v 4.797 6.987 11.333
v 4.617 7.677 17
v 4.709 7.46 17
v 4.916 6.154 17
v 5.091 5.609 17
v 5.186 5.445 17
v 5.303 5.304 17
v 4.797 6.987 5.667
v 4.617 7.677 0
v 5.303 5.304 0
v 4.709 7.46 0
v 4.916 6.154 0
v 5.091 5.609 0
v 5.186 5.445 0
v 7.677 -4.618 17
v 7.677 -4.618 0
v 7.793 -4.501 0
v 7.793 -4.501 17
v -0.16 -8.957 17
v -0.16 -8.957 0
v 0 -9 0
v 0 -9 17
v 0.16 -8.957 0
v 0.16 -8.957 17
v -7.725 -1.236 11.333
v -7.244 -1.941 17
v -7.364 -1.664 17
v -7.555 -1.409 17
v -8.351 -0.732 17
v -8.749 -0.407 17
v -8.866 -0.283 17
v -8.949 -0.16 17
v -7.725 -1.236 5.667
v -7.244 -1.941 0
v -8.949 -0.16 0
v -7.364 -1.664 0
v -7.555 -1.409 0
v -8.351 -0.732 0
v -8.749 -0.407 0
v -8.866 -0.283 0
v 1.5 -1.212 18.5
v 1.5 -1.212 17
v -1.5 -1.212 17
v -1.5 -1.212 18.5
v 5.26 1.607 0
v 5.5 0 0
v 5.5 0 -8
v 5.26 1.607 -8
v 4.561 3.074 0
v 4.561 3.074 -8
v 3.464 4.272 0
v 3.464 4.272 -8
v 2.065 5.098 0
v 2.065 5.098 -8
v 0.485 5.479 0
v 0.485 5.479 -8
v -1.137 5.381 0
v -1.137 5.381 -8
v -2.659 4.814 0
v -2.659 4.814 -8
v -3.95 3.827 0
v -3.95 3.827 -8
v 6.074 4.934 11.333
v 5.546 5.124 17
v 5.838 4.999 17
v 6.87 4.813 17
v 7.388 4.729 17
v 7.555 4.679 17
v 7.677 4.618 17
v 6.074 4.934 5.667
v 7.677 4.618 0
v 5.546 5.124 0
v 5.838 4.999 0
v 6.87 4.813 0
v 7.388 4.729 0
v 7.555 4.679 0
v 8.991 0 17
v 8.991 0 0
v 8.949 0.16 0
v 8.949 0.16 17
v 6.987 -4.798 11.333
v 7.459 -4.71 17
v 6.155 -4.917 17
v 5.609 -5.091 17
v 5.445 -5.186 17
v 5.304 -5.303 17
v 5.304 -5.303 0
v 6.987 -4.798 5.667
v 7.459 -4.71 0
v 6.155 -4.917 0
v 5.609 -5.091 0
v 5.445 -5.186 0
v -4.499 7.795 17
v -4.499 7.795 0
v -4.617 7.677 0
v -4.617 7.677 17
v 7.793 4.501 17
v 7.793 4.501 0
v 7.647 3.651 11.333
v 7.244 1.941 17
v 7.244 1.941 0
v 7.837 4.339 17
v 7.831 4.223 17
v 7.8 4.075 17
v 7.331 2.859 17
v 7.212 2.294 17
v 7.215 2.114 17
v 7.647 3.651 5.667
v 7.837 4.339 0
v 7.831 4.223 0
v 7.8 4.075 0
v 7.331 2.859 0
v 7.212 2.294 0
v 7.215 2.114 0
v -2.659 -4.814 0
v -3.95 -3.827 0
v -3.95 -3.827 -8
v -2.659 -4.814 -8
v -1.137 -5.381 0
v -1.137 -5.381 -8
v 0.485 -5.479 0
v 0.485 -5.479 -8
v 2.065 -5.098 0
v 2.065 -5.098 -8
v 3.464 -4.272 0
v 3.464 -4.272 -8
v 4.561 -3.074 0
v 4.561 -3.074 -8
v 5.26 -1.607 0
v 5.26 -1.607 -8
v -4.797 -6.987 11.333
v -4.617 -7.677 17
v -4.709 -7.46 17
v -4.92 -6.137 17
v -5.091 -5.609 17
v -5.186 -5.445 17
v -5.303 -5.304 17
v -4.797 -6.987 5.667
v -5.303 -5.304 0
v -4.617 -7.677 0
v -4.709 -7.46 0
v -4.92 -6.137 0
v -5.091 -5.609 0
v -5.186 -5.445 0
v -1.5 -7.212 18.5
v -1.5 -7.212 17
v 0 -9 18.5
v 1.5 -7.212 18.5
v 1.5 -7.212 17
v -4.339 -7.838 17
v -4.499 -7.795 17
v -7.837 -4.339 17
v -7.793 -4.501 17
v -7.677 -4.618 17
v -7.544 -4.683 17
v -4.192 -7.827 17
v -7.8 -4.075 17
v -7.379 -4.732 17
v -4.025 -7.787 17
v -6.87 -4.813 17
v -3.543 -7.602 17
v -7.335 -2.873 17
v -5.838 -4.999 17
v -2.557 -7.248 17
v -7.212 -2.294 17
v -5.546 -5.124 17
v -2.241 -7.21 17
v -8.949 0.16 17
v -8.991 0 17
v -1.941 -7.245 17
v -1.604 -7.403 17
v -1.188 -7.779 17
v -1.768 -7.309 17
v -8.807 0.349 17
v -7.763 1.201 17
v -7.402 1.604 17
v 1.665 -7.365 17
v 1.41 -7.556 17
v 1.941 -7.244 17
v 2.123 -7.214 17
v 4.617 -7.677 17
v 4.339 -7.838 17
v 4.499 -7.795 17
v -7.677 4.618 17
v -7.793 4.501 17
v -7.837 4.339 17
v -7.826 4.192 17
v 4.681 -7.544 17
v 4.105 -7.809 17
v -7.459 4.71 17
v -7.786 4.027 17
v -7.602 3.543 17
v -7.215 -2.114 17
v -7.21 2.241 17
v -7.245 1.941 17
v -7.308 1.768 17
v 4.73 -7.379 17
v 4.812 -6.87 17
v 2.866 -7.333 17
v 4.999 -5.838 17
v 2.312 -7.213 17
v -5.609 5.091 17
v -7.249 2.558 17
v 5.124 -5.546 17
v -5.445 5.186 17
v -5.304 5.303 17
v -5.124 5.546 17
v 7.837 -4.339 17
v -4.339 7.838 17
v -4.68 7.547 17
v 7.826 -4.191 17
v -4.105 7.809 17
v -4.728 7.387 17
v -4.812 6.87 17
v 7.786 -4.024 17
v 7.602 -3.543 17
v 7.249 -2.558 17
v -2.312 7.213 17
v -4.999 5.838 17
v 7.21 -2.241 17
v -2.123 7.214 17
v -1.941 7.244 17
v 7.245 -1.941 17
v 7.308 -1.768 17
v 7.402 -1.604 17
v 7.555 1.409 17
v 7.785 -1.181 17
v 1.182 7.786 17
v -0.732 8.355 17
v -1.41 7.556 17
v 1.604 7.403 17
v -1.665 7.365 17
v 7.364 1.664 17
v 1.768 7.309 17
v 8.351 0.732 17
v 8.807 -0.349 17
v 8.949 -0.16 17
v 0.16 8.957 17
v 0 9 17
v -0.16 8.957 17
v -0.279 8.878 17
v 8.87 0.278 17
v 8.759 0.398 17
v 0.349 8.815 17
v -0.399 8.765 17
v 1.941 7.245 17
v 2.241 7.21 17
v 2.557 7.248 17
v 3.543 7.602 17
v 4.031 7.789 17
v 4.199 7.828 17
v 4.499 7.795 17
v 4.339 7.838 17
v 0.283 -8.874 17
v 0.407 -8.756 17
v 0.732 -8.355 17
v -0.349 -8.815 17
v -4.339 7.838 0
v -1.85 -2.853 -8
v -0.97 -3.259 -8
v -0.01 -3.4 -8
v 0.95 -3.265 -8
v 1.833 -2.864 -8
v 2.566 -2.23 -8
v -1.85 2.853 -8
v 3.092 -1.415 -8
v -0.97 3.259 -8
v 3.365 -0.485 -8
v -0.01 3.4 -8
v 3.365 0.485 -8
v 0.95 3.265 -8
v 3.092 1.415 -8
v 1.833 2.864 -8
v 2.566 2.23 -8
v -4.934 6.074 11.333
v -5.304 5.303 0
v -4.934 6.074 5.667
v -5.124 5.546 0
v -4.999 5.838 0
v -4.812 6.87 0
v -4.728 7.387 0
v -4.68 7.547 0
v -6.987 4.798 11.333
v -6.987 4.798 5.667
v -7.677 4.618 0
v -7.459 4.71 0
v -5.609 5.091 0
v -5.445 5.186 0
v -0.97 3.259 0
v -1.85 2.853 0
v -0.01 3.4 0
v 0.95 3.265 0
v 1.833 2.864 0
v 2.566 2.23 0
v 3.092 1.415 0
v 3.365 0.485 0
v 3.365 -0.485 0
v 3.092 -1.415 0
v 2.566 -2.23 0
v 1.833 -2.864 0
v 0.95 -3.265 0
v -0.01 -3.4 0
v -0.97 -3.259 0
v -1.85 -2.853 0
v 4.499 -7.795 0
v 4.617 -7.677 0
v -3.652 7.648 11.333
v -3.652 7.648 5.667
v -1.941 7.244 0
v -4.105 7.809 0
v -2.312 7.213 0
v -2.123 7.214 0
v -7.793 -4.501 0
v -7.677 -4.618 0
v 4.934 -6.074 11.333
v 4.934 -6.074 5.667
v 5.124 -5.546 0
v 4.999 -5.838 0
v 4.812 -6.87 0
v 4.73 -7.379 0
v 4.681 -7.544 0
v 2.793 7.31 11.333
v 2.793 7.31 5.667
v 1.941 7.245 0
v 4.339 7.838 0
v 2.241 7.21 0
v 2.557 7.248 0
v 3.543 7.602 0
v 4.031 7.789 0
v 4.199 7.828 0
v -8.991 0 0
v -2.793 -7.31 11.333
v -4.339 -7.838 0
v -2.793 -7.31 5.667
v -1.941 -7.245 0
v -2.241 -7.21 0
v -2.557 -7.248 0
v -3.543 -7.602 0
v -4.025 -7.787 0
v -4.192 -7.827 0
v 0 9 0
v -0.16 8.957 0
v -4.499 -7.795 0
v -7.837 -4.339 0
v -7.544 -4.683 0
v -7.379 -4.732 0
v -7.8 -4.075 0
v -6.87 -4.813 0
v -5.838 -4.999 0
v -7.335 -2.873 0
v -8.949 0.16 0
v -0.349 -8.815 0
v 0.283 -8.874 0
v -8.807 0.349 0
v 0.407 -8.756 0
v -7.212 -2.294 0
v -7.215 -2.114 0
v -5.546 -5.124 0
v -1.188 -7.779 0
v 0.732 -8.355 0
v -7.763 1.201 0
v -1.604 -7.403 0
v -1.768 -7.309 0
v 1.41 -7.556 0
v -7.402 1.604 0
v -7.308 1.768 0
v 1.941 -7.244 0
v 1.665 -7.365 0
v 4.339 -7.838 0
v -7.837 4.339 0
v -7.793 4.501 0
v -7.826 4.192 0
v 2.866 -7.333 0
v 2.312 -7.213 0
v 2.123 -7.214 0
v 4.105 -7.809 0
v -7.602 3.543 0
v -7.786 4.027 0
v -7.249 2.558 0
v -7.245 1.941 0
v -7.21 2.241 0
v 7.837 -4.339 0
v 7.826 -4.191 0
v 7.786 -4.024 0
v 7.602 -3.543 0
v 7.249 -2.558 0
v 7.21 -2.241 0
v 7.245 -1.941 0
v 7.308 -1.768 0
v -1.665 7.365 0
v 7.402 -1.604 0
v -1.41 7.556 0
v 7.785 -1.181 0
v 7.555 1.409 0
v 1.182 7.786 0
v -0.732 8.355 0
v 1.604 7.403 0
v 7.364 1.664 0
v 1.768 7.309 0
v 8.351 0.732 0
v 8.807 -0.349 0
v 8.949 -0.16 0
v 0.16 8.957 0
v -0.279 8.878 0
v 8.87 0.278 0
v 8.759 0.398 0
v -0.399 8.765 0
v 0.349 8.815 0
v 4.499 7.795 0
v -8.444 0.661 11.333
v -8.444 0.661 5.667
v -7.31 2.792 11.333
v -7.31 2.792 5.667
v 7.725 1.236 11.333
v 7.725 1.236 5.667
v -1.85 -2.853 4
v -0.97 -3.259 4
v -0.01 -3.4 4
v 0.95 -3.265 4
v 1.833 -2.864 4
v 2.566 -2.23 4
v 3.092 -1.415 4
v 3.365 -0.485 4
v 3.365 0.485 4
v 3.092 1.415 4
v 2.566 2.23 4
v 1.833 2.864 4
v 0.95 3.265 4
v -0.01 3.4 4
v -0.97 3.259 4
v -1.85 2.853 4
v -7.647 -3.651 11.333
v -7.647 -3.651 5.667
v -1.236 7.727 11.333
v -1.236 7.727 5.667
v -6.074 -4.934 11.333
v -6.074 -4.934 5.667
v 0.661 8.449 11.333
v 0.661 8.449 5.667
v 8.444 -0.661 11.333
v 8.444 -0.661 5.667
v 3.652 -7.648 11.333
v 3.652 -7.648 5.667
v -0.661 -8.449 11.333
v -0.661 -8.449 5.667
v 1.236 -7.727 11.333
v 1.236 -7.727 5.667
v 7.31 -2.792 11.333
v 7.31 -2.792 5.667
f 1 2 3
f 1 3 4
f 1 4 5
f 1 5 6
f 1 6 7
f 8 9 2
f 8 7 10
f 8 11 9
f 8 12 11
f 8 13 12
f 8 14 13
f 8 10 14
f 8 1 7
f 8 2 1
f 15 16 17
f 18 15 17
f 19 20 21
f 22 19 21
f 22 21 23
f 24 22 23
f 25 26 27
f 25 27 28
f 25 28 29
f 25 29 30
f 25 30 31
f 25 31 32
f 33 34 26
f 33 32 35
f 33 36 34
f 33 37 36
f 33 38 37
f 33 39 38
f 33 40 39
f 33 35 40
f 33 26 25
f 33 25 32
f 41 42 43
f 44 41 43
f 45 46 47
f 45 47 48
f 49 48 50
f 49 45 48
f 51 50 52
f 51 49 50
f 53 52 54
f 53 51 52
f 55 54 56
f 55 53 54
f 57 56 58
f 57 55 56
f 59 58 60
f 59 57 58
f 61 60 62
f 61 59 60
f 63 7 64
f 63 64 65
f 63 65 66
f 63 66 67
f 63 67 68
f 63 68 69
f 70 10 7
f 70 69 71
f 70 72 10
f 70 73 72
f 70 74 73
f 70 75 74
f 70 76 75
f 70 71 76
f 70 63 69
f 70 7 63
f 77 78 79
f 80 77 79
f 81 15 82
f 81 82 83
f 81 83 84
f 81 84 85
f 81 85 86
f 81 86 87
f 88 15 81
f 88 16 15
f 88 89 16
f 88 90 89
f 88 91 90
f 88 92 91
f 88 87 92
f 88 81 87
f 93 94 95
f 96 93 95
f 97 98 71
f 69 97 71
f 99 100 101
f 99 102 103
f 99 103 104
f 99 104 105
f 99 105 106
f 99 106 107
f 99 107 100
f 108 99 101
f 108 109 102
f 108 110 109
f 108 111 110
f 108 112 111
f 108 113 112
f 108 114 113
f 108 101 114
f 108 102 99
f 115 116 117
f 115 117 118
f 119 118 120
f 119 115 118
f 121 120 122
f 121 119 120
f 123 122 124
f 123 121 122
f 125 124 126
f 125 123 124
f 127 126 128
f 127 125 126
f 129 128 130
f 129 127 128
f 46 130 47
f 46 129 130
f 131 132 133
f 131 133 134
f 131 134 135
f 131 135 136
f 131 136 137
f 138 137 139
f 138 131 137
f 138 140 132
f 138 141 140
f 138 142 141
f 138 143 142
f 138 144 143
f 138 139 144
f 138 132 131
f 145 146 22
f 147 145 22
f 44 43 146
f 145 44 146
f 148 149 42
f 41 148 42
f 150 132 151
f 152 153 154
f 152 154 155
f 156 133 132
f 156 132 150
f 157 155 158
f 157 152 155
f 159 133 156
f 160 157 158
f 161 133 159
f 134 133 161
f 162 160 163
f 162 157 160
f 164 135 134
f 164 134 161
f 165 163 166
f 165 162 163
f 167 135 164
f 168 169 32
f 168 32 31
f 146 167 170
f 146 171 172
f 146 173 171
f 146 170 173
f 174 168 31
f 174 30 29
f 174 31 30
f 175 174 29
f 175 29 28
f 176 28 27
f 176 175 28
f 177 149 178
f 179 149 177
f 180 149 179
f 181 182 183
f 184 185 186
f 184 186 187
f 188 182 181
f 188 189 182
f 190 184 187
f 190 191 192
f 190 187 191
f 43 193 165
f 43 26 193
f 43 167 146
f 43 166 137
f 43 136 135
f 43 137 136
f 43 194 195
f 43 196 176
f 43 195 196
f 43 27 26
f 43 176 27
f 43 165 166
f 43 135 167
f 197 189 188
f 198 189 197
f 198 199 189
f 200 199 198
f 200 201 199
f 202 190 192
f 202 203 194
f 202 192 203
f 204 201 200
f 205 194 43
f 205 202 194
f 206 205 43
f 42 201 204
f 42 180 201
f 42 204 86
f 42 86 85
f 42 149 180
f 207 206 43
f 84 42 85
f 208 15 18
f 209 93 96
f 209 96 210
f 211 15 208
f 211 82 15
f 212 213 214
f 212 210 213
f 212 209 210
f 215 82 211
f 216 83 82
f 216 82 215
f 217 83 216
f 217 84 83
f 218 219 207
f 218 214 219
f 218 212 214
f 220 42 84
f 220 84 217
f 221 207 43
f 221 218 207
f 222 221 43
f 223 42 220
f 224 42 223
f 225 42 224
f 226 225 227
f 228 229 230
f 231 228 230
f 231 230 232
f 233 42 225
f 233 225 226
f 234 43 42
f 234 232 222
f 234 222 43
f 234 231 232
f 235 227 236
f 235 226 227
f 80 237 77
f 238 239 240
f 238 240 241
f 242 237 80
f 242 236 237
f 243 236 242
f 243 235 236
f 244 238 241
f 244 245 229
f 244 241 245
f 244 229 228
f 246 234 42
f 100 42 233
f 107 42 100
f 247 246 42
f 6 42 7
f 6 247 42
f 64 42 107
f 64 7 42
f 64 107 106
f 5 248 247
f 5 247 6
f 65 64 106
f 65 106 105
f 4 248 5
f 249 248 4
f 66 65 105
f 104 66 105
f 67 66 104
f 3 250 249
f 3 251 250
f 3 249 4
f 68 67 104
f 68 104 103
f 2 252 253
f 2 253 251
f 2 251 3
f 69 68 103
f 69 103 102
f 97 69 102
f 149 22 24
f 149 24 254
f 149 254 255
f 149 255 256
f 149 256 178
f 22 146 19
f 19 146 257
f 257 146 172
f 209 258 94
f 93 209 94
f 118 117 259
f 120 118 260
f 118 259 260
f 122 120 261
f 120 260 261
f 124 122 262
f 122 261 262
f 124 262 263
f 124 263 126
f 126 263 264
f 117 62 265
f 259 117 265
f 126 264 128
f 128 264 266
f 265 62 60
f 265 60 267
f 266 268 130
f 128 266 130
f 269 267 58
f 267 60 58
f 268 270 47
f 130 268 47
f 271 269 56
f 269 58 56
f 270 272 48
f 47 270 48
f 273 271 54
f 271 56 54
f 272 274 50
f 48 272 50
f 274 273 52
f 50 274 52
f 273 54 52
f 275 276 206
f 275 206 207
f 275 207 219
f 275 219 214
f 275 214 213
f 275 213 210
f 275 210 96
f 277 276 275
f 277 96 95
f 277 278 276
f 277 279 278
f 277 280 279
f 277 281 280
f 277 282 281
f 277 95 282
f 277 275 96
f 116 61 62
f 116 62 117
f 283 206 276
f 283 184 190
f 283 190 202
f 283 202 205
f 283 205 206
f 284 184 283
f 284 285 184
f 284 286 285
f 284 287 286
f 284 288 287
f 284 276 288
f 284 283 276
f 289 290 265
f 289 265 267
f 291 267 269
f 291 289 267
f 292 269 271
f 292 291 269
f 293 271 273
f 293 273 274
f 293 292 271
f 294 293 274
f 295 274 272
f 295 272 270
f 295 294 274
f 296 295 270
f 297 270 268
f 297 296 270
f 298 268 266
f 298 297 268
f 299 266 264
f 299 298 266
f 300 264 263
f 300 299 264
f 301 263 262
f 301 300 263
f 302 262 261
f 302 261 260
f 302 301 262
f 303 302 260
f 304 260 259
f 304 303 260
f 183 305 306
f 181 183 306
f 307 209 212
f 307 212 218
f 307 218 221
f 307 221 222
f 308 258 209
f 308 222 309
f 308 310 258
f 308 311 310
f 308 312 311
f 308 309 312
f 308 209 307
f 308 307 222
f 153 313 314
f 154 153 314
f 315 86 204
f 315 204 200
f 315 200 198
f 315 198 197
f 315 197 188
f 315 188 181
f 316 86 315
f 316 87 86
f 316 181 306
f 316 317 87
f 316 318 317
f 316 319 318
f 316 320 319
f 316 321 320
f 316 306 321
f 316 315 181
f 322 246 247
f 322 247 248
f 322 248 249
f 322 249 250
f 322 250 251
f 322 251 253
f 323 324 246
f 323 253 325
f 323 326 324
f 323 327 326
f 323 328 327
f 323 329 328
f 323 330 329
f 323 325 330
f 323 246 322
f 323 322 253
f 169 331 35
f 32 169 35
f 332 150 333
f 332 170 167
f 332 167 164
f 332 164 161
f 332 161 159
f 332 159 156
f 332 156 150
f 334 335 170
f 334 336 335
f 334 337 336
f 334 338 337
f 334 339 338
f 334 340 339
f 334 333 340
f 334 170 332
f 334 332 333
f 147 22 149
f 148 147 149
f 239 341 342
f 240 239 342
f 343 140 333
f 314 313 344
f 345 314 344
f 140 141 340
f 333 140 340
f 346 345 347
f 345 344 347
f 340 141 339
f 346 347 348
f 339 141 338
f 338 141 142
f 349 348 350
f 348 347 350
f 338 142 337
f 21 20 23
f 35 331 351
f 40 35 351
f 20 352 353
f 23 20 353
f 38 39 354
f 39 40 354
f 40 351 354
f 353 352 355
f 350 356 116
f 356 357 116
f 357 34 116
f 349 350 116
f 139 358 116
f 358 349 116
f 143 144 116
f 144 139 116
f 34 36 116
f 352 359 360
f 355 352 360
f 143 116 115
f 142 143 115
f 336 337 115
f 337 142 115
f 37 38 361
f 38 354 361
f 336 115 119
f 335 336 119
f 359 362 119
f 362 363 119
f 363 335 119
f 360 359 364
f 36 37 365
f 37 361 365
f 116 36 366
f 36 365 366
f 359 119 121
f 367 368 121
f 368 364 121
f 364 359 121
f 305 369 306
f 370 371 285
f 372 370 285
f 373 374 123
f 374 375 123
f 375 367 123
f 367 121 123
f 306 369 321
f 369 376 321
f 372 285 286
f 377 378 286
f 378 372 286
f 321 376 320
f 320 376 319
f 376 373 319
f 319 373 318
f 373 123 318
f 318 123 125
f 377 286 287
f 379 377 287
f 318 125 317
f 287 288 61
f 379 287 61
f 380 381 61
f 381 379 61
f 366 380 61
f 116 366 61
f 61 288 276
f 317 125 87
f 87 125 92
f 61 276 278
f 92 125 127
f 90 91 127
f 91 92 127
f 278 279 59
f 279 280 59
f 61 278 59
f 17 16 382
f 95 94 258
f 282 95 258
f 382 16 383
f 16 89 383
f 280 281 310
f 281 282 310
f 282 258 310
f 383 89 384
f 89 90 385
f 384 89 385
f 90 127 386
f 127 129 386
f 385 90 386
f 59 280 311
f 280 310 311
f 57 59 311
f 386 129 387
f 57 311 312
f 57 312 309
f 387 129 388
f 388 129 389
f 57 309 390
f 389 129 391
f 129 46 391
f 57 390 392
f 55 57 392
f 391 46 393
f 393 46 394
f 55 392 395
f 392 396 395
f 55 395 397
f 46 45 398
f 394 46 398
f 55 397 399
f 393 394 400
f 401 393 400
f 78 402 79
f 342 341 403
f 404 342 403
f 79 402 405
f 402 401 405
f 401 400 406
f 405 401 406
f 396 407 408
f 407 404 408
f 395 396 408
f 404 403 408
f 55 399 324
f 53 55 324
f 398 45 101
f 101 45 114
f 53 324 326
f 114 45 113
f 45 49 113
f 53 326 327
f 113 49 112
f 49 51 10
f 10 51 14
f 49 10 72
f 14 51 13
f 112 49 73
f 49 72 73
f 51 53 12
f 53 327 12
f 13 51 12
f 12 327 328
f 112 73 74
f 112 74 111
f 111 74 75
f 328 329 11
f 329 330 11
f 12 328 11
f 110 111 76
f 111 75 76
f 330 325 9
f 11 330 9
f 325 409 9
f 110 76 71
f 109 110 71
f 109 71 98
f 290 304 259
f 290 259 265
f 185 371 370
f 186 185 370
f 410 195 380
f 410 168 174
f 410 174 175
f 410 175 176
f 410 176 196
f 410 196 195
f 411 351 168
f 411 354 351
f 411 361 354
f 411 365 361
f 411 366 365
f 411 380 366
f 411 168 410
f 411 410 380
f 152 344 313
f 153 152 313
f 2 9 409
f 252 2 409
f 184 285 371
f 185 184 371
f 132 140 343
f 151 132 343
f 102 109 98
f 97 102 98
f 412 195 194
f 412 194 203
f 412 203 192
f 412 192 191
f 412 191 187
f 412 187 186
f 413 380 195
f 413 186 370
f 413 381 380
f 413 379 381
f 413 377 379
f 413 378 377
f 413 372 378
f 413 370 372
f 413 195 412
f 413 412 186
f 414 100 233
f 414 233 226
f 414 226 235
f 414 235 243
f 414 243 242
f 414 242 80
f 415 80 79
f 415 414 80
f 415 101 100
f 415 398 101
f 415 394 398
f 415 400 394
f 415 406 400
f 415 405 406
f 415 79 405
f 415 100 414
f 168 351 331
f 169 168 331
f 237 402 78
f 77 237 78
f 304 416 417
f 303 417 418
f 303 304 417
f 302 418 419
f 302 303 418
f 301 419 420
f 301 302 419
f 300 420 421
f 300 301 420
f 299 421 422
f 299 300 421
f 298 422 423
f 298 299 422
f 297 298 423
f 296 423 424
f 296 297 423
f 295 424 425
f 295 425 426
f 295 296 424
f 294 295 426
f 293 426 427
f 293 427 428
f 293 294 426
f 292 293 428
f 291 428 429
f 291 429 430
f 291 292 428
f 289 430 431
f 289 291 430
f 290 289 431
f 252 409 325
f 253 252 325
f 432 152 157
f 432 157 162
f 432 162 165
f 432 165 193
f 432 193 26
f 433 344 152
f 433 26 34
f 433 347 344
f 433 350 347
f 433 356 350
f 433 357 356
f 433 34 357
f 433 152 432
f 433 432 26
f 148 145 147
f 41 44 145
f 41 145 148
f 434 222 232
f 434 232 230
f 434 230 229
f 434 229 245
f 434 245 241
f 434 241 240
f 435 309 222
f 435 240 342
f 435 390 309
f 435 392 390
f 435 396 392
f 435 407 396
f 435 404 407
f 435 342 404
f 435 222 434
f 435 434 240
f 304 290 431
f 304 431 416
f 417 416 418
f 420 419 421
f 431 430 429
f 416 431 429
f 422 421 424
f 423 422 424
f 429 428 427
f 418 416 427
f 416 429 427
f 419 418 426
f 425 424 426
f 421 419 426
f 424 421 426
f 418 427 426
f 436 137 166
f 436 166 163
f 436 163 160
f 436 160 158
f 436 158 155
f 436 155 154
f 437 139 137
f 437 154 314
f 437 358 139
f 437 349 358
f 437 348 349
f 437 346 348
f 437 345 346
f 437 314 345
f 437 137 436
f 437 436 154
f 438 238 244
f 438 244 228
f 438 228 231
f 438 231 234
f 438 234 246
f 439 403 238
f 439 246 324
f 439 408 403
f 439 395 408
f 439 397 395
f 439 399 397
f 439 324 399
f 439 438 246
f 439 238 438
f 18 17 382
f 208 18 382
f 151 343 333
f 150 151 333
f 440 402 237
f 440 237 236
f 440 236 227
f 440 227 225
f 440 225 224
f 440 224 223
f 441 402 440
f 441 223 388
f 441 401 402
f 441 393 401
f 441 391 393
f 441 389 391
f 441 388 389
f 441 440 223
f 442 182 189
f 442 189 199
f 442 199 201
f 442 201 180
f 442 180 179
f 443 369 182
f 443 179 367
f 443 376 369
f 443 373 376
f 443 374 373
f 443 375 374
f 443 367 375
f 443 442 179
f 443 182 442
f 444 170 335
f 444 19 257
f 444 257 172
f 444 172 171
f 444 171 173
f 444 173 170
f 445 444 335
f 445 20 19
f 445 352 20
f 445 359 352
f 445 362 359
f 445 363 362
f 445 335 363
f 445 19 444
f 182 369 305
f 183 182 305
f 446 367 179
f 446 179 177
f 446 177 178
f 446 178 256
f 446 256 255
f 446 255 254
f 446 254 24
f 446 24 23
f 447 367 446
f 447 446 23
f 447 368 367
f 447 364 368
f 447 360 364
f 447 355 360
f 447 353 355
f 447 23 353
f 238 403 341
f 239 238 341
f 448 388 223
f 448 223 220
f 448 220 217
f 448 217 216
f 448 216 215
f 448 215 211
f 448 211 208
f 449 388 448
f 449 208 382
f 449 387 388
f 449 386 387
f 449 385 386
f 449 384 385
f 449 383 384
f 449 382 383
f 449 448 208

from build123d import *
from build123d import SkipClean  # not in build123d's __all__

# Parameters (mm, degrees)
F1_DEPTH = 17
F2_DEPTH = 8
F3_DEPTH = 4
F5_DEPTH = 1.5


# Not quite as in the source:
# - after a boolean that leaves OpenCascade's solid faulty, fix() repairs it
# - a feature names something its author has since deleted; it is built from what else it names


with BuildPart() as f1:
    # F0 (on Top) → F1 (new body)
    with BuildSketch(Plane.XY):
        Polygon((-7.2445266217, 1.9408333333), (-7.2443607594, -1.9414523397), (-5.303074282, -5.3035274261), (-1.9408333333, -7.2445266217), (1.9414523397, -7.2443607594), (5.3035274261, -5.303074282), (7.2445266217, -1.9408333333), (7.2443607594, 1.9414523397), (5.303074282, 5.3035274261), (1.9408333333, 7.2445266217), (-1.9414523397, 7.2443607594), (-5.3035274261, 5.303074282), align=None)
        with BuildLine():
            ThreePointArc((-3.95, 3.8272052467), (2.0645822822, 5.0977936404), (5.5, 0))
            ThreePointArc((5.5, 0), (2.0645822822, -5.0977936404), (-3.95, -3.8272052467))
            ThreePointArc((-3.95, -3.8272052467), (-5.5, 0), (-3.95, 3.8272052467))
        make_face(mode=Mode.SUBTRACT)
        with BuildLine():
            ThreePointArc((-3.95, -3.8272052467), (2.0645822822, -5.0977936404), (5.5, 0))
            ThreePointArc((5.5, 0), (2.0645822822, 5.0977936404), (-3.95, 3.8272052467))
            Line((-3.95, 3.8272052467), (-3.95, -3.8272052467))
        make_face()
        with BuildLine():
            Line((-1.85, -2.8526303651), (-1.85, 2.8526303651))
            ThreePointArc((-1.85, 2.8526303651), (3.4, 0), (-1.85, -2.8526303651))
        make_face(mode=Mode.SUBTRACT)
        with BuildLine():
            ThreePointArc((-1.85, -2.8526303651), (3.4, 0), (-1.85, 2.8526303651))
            Line((-1.85, 2.8526303651), (-1.85, -2.8526303651))
        make_face()
        with BuildLine():
            Line((-3.95, -3.8272052467), (-3.95, 3.8272052467))
            ThreePointArc((-3.95, 3.8272052467), (-5.5, 0), (-3.95, -3.8272052467))
        make_face()
        with BuildLine():
            add(Edge.make_bspline(
                [(5.303074282, 5.3035274261), (5.8806686185, 4.7260804431), (7.2203514603, 4.9114598493), (7.6765424159, 4.6182190274)],
                knots=[0.1250207704, 0.1250207704, 0.1250207704, 0.1250207704, 0.1625294045, 0.1625294045, 0.1625294045, 0.1625294045], degree=3))
            Line((5.303074282, 5.3035274261), (7.2443607594, 1.9414523397))
            add(Edge.make_bspline(
                [(7.836712211, 4.338802441), (7.8605022236, 3.7962755696), (7.0343491304, 2.7298107055), (7.2443607594, 1.9414523397)],
                knots=[0.1709157668, 0.1709157668, 0.1709157668, 0.1709157668, 0.2083694642, 0.2083694642, 0.2083694642, 0.2083694642], degree=3))
            Line((7.836712211, 4.338802441), (7.7934595092, 4.5013319004))
            Line((7.7934595092, 4.5013319004), (7.6765424159, 4.6182190274))
        make_face()
        with BuildLine():
            Line((7.2445266217, -1.9408333333), (5.3035274261, -5.303074282))
            add(Edge.make_bspline(
                [(7.6765915068, -4.6181699492), (7.2205093081, -4.9113554899), (5.8811502119, -4.725750538), (5.3035274261, -5.303074282)],
                knots=[0.3374691289, 0.3374691289, 0.3374691289, 0.3374691289, 0.3749746888, 0.3749746888, 0.3749746888, 0.3749746888], degree=3))
            Line((7.6765915068, -4.6181699492), (7.7934595092, -4.5013319004))
            Line((7.7934595092, -4.5013319004), (7.8367302299, -4.3387347317))
            add(Edge.make_bspline(
                [(7.2445266217, -1.9408333333), (7.0343944918, -2.729228444), (7.8605138313, -3.7960853183), (7.8367302299, -4.3387347317)],
                knots=[0.2916259951, 0.2916259951, 0.2916259951, 0.2916259951, 0.3290827591, 0.3290827591, 0.3290827591, 0.3290827591], degree=3))
        make_face()
        with BuildLine():
            Line((-7.836712211, -4.338802441), (-7.7934595092, -4.5013319004))
            Line((-7.7934595092, -4.5013319004), (-7.6765424159, -4.6182190274))
            add(Edge.make_bspline(
                [(-5.303074282, -5.3035274261), (-5.8806686185, -4.7260804431), (-7.2203514603, -4.9114598493), (-7.6765424159, -4.6182190274)],
                knots=[0.6250207704, 0.6250207704, 0.6250207704, 0.6250207704, 0.6625294045, 0.6625294045, 0.6625294045, 0.6625294045], degree=3))
            Line((-5.303074282, -5.3035274261), (-7.2443607594, -1.9414523397))
            add(Edge.make_bspline(
                [(-7.836712211, -4.338802441), (-7.8605022236, -3.7962755696), (-7.0343491304, -2.7298107055), (-7.2443607594, -1.9414523397)],
                knots=[0.6709157668, 0.6709157668, 0.6709157668, 0.6709157668, 0.7083694642, 0.7083694642, 0.7083694642, 0.7083694642], degree=3))
        make_face()
        with BuildLine():
            add(Edge.make_bspline(
                [(-7.2445266217, 1.9408333333), (-7.0343944918, 2.729228444), (-7.8605138313, 3.7960853183), (-7.8367302299, 4.3387347317)],
                knots=[0.7916259951, 0.7916259951, 0.7916259951, 0.7916259951, 0.8290827591, 0.8290827591, 0.8290827591, 0.8290827591], degree=3))
            Line((-7.2445266217, 1.9408333333), (-5.3035274261, 5.303074282))
            add(Edge.make_bspline(
                [(-7.6765915068, 4.6181699492), (-7.2205093081, 4.9113554899), (-5.8811502119, 4.725750538), (-5.3035274261, 5.303074282)],
                knots=[0.8374691289, 0.8374691289, 0.8374691289, 0.8374691289, 0.8749746888, 0.8749746888, 0.8749746888, 0.8749746888], degree=3))
            Line((-7.6765915068, 4.6181699492), (-7.7934595092, 4.5013319004))
            Line((-7.7934595092, 4.5013319004), (-7.8367302299, 4.3387347317))
        make_face()
        with BuildLine():
            add(Edge.make_bspline(
                [(-5.3035274261, 5.303074282), (-4.7259202525, 5.8803824219), (-4.9100082127, 7.220578017), (-4.616771189, 7.6772060222)],
                knots=[0.8749746888, 0.8749746888, 0.8749746888, 0.8749746888, 0.912479235, 0.912479235, 0.912479235, 0.912479235], degree=3))
            Line((-5.3035274261, 5.303074282), (-1.9414523397, 7.2443607594))
            add(Edge.make_bspline(
                [(-4.3392026037, 7.8375128572), (-3.7975030713, 7.8631116303), (-2.7301851448, 7.0331622426), (-1.9414523397, 7.2443607594)],
                knots=[0.9208262715, 0.9208262715, 0.9208262715, 0.9208262715, 0.9583233826, 0.9583233826, 0.9583233826, 0.9583233826], degree=3))
            Line((-4.3392026037, 7.8375128572), (-4.4993340005, 7.7946131111))
            Line((-4.4993340005, 7.7946131111), (-4.616771189, 7.6772060222))
        make_face()
        with BuildLine():
            add(Edge.make_bspline(
                [(1.9408333333, 7.2445266217), (2.7296030644, 7.0332071753), (3.7973140152, 7.8631231549), (4.3391354979, 7.8375308351)],
                knots=[0.0416720765, 0.0416720765, 0.0416720765, 0.0416720765, 0.0791722617, 0.0791722617, 0.0791722617, 0.0791722617], degree=3))
            Line((1.9408333333, 7.2445266217), (5.303074282, 5.3035274261))
            add(Edge.make_bspline(
                [(4.6167220822, 7.6772551165), (4.9099036808, 7.2207359364), (4.7255902419, 5.8808641408), (5.303074282, 5.3035274261)],
                knots=[0.087519299, 0.087519299, 0.087519299, 0.087519299, 0.1250207704, 0.1250207704, 0.1250207704, 0.1250207704], degree=3))
            Line((4.6167220822, 7.6772551165), (4.4993340005, 7.7946131111))
            Line((4.4993340005, 7.7946131111), (4.3391354979, 7.8375308351))
        make_face()
        with BuildLine():
            Line((5.3035274261, -5.303074282), (1.9414523397, -7.2443607594))
            add(Edge.make_bspline(
                [(4.3392026037, -7.8375128572), (3.7975030713, -7.8631116303), (2.7301851448, -7.0331622426), (1.9414523397, -7.2443607594)],
                knots=[0.4208262715, 0.4208262715, 0.4208262715, 0.4208262715, 0.4583233826, 0.4583233826, 0.4583233826, 0.4583233826], degree=3))
            Line((4.3392026037, -7.8375128572), (4.4993340005, -7.7946131111))
            Line((4.4993340005, -7.7946131111), (4.616771189, -7.6772060222))
            add(Edge.make_bspline(
                [(5.3035274261, -5.303074282), (4.7259202525, -5.8803824219), (4.9100082127, -7.220578017), (4.616771189, -7.6772060222)],
                knots=[0.3749746888, 0.3749746888, 0.3749746888, 0.3749746888, 0.412479235, 0.412479235, 0.412479235, 0.412479235], degree=3))
        make_face()
        with BuildLine():
            add(Edge.make_bspline(
                [(-4.6167220822, -7.6772551165), (-4.9099036808, -7.2207359364), (-4.7255902419, -5.8808641408), (-5.303074282, -5.3035274261)],
                knots=[0.587519299, 0.587519299, 0.587519299, 0.587519299, 0.6250207704, 0.6250207704, 0.6250207704, 0.6250207704], degree=3))
            Line((-4.6167220822, -7.6772551165), (-4.4993340005, -7.7946131111))
            Line((-4.4993340005, -7.7946131111), (-4.3391354979, -7.8375308351))
            add(Edge.make_bspline(
                [(-1.9408333333, -7.2445266217), (-2.7296030644, -7.0332071753), (-3.7973140152, -7.8631231549), (-4.3391354979, -7.8375308351)],
                knots=[0.5416720765, 0.5416720765, 0.5416720765, 0.5416720765, 0.5791722617, 0.5791722617, 0.5791722617, 0.5791722617], degree=3))
            Line((-1.9408333333, -7.2445266217), (-5.303074282, -5.3035274261))
        make_face()
        with BuildLine():
            add(Edge.make_bspline(
                [(-1.9414523397, 7.2443607594), (-1.1526036351, 7.4555903106), (-0.6424219306, 8.7082737692), (-0.1602865257, 8.9570586944)],
                knots=[0.9583233826, 0.9583233826, 0.9583233826, 0.9583233826, 0.9958260038, 0.9958260038, 0.9958260038, 0.9958260038], degree=3))
            Line((-1.9414523397, 7.2443607594), (1.9408333333, 7.2445266217))
            add(Edge.make_bspline(
                [(0.1602194418, 8.9570766663), (0.6422524515, 8.7083582889), (1.1520770317, 7.4558424701), (1.9408333333, 7.2445266217)],
                knots=[0.0041725298, 0.0041725298, 0.0041725298, 0.0041725298, 0.0416720765, 0.0416720765, 0.0416720765, 0.0416720765], degree=3))
            Line((0.1602194418, 8.9570766663), (0, 9))
            Line((0, 9), (-0.1602865257, 8.9570586944))
        make_face()
        with BuildLine():
            Line((1.9414523397, -7.2443607594), (-1.9408333333, -7.2445266217))
            add(Edge.make_bspline(
                [(-0.1602194418, -8.9570766663), (-0.6422524515, -8.7083582889), (-1.1520770317, -7.4558424701), (-1.9408333333, -7.2445266217)],
                knots=[0.5041725298, 0.5041725298, 0.5041725298, 0.5041725298, 0.5416720765, 0.5416720765, 0.5416720765, 0.5416720765], degree=3))
            Line((-0.1602194418, -8.9570766663), (0, -9))
            Line((0, -9), (0.1602865257, -8.9570586944))
            add(Edge.make_bspline(
                [(1.9414523397, -7.2443607594), (1.1526036351, -7.4555903106), (0.6424219306, -8.7082737692), (0.1602865257, -8.9570586944)],
                knots=[0.4583233826, 0.4583233826, 0.4583233826, 0.4583233826, 0.4958260038, 0.4958260038, 0.4958260038, 0.4958260038], degree=3))
        make_face()
        with BuildLine():
            Line((7.2443607594, 1.9414523397), (7.2445266217, -1.9408333333))
            add(Edge.make_bspline(
                [(8.9487800371, -0.160016485), (8.7015742639, -0.6422872861), (7.4547035861, -1.1522700079), (7.2445266217, -1.9408333333)],
                knots=[0.2541612392, 0.2541612392, 0.2541612392, 0.2541612392, 0.2916259951, 0.2916259951, 0.2916259951, 0.2916259951], degree=3))
            Line((8.9487800371, -0.160016485), (8.9913639805, 0))
            Line((8.9913639805, 0), (8.948762183, 0.1600835748))
            add(Edge.make_bspline(
                [(7.2443607594, 1.9414523397), (7.4544516979, 1.1527962558), (8.701490107, 0.6424567599), (8.948762183, 0.1600835748)],
                knots=[0.2083694642, 0.2083694642, 0.2083694642, 0.2083694642, 0.2458373058, 0.2458373058, 0.2458373058, 0.2458373058], degree=3))
        make_face()
        with BuildLine():
            Line((-8.9913639805, 0), (-8.948762183, -0.1600835748))
            add(Edge.make_bspline(
                [(-7.2443607594, -1.9414523397), (-7.4544516979, -1.1527962558), (-8.701490107, -0.6424567599), (-8.948762183, -0.1600835748)],
                knots=[0.7083694642, 0.7083694642, 0.7083694642, 0.7083694642, 0.7458373058, 0.7458373058, 0.7458373058, 0.7458373058], degree=3))
            Line((-7.2443607594, -1.9414523397), (-7.2445266217, 1.9408333333))
            add(Edge.make_bspline(
                [(-8.9487800371, 0.160016485), (-8.7015742639, 0.6422872861), (-7.4547035861, 1.1522700079), (-7.2445266217, 1.9408333333)],
                knots=[0.7541612392, 0.7541612392, 0.7541612392, 0.7541612392, 0.7916259951, 0.7916259951, 0.7916259951, 0.7916259951], degree=3))
            Line((-8.9487800371, 0.160016485), (-8.9913639805, 0))
        make_face()
    extrude(amount=F1_DEPTH)

    # F0 (on Top) → F2 (join)
    with BuildSketch(Plane.XY):
        with BuildLine():
            ThreePointArc((-3.95, -3.8272052467), (2.0645822822, -5.0977936404), (5.5, 0))
            ThreePointArc((5.5, 0), (2.0645822822, 5.0977936404), (-3.95, 3.8272052467))
            Line((-3.95, 3.8272052467), (-3.95, -3.8272052467))
        make_face()
        with BuildLine():
            Line((-1.85, -2.8526303651), (-1.85, 2.8526303651))
            ThreePointArc((-1.85, 2.8526303651), (3.4, 0), (-1.85, -2.8526303651))
        make_face(mode=Mode.SUBTRACT)
    extrude(amount=-F2_DEPTH)

    # F0 (on Top) → F3 (cut)
    with BuildSketch(Plane.XY):
        with BuildLine():
            ThreePointArc((-1.85, -2.8526303651), (3.4, 0), (-1.85, 2.8526303651))
            Line((-1.85, 2.8526303651), (-1.85, -2.8526303651))
        make_face()
    with SkipClean():  # cleaning this boolean's faces spoils the solid; the shape is the same uncleaned
        extrude(amount=F3_DEPTH, mode=Mode.SUBTRACT)

    # F4 (on face) → F5 (join)
    with BuildSketch(Plane.XY.offset(17)):
        Polygon((-1.5, -1.2123696111), (-1.5, -7.2123696111), (0, -9), (1.5, -7.2123696111), (1.5, -1.2123696111), align=None)
    extrude(amount=F5_DEPTH)

    add(f1.part.fix(), mode=Mode.REPLACE)


solid = f1.part
